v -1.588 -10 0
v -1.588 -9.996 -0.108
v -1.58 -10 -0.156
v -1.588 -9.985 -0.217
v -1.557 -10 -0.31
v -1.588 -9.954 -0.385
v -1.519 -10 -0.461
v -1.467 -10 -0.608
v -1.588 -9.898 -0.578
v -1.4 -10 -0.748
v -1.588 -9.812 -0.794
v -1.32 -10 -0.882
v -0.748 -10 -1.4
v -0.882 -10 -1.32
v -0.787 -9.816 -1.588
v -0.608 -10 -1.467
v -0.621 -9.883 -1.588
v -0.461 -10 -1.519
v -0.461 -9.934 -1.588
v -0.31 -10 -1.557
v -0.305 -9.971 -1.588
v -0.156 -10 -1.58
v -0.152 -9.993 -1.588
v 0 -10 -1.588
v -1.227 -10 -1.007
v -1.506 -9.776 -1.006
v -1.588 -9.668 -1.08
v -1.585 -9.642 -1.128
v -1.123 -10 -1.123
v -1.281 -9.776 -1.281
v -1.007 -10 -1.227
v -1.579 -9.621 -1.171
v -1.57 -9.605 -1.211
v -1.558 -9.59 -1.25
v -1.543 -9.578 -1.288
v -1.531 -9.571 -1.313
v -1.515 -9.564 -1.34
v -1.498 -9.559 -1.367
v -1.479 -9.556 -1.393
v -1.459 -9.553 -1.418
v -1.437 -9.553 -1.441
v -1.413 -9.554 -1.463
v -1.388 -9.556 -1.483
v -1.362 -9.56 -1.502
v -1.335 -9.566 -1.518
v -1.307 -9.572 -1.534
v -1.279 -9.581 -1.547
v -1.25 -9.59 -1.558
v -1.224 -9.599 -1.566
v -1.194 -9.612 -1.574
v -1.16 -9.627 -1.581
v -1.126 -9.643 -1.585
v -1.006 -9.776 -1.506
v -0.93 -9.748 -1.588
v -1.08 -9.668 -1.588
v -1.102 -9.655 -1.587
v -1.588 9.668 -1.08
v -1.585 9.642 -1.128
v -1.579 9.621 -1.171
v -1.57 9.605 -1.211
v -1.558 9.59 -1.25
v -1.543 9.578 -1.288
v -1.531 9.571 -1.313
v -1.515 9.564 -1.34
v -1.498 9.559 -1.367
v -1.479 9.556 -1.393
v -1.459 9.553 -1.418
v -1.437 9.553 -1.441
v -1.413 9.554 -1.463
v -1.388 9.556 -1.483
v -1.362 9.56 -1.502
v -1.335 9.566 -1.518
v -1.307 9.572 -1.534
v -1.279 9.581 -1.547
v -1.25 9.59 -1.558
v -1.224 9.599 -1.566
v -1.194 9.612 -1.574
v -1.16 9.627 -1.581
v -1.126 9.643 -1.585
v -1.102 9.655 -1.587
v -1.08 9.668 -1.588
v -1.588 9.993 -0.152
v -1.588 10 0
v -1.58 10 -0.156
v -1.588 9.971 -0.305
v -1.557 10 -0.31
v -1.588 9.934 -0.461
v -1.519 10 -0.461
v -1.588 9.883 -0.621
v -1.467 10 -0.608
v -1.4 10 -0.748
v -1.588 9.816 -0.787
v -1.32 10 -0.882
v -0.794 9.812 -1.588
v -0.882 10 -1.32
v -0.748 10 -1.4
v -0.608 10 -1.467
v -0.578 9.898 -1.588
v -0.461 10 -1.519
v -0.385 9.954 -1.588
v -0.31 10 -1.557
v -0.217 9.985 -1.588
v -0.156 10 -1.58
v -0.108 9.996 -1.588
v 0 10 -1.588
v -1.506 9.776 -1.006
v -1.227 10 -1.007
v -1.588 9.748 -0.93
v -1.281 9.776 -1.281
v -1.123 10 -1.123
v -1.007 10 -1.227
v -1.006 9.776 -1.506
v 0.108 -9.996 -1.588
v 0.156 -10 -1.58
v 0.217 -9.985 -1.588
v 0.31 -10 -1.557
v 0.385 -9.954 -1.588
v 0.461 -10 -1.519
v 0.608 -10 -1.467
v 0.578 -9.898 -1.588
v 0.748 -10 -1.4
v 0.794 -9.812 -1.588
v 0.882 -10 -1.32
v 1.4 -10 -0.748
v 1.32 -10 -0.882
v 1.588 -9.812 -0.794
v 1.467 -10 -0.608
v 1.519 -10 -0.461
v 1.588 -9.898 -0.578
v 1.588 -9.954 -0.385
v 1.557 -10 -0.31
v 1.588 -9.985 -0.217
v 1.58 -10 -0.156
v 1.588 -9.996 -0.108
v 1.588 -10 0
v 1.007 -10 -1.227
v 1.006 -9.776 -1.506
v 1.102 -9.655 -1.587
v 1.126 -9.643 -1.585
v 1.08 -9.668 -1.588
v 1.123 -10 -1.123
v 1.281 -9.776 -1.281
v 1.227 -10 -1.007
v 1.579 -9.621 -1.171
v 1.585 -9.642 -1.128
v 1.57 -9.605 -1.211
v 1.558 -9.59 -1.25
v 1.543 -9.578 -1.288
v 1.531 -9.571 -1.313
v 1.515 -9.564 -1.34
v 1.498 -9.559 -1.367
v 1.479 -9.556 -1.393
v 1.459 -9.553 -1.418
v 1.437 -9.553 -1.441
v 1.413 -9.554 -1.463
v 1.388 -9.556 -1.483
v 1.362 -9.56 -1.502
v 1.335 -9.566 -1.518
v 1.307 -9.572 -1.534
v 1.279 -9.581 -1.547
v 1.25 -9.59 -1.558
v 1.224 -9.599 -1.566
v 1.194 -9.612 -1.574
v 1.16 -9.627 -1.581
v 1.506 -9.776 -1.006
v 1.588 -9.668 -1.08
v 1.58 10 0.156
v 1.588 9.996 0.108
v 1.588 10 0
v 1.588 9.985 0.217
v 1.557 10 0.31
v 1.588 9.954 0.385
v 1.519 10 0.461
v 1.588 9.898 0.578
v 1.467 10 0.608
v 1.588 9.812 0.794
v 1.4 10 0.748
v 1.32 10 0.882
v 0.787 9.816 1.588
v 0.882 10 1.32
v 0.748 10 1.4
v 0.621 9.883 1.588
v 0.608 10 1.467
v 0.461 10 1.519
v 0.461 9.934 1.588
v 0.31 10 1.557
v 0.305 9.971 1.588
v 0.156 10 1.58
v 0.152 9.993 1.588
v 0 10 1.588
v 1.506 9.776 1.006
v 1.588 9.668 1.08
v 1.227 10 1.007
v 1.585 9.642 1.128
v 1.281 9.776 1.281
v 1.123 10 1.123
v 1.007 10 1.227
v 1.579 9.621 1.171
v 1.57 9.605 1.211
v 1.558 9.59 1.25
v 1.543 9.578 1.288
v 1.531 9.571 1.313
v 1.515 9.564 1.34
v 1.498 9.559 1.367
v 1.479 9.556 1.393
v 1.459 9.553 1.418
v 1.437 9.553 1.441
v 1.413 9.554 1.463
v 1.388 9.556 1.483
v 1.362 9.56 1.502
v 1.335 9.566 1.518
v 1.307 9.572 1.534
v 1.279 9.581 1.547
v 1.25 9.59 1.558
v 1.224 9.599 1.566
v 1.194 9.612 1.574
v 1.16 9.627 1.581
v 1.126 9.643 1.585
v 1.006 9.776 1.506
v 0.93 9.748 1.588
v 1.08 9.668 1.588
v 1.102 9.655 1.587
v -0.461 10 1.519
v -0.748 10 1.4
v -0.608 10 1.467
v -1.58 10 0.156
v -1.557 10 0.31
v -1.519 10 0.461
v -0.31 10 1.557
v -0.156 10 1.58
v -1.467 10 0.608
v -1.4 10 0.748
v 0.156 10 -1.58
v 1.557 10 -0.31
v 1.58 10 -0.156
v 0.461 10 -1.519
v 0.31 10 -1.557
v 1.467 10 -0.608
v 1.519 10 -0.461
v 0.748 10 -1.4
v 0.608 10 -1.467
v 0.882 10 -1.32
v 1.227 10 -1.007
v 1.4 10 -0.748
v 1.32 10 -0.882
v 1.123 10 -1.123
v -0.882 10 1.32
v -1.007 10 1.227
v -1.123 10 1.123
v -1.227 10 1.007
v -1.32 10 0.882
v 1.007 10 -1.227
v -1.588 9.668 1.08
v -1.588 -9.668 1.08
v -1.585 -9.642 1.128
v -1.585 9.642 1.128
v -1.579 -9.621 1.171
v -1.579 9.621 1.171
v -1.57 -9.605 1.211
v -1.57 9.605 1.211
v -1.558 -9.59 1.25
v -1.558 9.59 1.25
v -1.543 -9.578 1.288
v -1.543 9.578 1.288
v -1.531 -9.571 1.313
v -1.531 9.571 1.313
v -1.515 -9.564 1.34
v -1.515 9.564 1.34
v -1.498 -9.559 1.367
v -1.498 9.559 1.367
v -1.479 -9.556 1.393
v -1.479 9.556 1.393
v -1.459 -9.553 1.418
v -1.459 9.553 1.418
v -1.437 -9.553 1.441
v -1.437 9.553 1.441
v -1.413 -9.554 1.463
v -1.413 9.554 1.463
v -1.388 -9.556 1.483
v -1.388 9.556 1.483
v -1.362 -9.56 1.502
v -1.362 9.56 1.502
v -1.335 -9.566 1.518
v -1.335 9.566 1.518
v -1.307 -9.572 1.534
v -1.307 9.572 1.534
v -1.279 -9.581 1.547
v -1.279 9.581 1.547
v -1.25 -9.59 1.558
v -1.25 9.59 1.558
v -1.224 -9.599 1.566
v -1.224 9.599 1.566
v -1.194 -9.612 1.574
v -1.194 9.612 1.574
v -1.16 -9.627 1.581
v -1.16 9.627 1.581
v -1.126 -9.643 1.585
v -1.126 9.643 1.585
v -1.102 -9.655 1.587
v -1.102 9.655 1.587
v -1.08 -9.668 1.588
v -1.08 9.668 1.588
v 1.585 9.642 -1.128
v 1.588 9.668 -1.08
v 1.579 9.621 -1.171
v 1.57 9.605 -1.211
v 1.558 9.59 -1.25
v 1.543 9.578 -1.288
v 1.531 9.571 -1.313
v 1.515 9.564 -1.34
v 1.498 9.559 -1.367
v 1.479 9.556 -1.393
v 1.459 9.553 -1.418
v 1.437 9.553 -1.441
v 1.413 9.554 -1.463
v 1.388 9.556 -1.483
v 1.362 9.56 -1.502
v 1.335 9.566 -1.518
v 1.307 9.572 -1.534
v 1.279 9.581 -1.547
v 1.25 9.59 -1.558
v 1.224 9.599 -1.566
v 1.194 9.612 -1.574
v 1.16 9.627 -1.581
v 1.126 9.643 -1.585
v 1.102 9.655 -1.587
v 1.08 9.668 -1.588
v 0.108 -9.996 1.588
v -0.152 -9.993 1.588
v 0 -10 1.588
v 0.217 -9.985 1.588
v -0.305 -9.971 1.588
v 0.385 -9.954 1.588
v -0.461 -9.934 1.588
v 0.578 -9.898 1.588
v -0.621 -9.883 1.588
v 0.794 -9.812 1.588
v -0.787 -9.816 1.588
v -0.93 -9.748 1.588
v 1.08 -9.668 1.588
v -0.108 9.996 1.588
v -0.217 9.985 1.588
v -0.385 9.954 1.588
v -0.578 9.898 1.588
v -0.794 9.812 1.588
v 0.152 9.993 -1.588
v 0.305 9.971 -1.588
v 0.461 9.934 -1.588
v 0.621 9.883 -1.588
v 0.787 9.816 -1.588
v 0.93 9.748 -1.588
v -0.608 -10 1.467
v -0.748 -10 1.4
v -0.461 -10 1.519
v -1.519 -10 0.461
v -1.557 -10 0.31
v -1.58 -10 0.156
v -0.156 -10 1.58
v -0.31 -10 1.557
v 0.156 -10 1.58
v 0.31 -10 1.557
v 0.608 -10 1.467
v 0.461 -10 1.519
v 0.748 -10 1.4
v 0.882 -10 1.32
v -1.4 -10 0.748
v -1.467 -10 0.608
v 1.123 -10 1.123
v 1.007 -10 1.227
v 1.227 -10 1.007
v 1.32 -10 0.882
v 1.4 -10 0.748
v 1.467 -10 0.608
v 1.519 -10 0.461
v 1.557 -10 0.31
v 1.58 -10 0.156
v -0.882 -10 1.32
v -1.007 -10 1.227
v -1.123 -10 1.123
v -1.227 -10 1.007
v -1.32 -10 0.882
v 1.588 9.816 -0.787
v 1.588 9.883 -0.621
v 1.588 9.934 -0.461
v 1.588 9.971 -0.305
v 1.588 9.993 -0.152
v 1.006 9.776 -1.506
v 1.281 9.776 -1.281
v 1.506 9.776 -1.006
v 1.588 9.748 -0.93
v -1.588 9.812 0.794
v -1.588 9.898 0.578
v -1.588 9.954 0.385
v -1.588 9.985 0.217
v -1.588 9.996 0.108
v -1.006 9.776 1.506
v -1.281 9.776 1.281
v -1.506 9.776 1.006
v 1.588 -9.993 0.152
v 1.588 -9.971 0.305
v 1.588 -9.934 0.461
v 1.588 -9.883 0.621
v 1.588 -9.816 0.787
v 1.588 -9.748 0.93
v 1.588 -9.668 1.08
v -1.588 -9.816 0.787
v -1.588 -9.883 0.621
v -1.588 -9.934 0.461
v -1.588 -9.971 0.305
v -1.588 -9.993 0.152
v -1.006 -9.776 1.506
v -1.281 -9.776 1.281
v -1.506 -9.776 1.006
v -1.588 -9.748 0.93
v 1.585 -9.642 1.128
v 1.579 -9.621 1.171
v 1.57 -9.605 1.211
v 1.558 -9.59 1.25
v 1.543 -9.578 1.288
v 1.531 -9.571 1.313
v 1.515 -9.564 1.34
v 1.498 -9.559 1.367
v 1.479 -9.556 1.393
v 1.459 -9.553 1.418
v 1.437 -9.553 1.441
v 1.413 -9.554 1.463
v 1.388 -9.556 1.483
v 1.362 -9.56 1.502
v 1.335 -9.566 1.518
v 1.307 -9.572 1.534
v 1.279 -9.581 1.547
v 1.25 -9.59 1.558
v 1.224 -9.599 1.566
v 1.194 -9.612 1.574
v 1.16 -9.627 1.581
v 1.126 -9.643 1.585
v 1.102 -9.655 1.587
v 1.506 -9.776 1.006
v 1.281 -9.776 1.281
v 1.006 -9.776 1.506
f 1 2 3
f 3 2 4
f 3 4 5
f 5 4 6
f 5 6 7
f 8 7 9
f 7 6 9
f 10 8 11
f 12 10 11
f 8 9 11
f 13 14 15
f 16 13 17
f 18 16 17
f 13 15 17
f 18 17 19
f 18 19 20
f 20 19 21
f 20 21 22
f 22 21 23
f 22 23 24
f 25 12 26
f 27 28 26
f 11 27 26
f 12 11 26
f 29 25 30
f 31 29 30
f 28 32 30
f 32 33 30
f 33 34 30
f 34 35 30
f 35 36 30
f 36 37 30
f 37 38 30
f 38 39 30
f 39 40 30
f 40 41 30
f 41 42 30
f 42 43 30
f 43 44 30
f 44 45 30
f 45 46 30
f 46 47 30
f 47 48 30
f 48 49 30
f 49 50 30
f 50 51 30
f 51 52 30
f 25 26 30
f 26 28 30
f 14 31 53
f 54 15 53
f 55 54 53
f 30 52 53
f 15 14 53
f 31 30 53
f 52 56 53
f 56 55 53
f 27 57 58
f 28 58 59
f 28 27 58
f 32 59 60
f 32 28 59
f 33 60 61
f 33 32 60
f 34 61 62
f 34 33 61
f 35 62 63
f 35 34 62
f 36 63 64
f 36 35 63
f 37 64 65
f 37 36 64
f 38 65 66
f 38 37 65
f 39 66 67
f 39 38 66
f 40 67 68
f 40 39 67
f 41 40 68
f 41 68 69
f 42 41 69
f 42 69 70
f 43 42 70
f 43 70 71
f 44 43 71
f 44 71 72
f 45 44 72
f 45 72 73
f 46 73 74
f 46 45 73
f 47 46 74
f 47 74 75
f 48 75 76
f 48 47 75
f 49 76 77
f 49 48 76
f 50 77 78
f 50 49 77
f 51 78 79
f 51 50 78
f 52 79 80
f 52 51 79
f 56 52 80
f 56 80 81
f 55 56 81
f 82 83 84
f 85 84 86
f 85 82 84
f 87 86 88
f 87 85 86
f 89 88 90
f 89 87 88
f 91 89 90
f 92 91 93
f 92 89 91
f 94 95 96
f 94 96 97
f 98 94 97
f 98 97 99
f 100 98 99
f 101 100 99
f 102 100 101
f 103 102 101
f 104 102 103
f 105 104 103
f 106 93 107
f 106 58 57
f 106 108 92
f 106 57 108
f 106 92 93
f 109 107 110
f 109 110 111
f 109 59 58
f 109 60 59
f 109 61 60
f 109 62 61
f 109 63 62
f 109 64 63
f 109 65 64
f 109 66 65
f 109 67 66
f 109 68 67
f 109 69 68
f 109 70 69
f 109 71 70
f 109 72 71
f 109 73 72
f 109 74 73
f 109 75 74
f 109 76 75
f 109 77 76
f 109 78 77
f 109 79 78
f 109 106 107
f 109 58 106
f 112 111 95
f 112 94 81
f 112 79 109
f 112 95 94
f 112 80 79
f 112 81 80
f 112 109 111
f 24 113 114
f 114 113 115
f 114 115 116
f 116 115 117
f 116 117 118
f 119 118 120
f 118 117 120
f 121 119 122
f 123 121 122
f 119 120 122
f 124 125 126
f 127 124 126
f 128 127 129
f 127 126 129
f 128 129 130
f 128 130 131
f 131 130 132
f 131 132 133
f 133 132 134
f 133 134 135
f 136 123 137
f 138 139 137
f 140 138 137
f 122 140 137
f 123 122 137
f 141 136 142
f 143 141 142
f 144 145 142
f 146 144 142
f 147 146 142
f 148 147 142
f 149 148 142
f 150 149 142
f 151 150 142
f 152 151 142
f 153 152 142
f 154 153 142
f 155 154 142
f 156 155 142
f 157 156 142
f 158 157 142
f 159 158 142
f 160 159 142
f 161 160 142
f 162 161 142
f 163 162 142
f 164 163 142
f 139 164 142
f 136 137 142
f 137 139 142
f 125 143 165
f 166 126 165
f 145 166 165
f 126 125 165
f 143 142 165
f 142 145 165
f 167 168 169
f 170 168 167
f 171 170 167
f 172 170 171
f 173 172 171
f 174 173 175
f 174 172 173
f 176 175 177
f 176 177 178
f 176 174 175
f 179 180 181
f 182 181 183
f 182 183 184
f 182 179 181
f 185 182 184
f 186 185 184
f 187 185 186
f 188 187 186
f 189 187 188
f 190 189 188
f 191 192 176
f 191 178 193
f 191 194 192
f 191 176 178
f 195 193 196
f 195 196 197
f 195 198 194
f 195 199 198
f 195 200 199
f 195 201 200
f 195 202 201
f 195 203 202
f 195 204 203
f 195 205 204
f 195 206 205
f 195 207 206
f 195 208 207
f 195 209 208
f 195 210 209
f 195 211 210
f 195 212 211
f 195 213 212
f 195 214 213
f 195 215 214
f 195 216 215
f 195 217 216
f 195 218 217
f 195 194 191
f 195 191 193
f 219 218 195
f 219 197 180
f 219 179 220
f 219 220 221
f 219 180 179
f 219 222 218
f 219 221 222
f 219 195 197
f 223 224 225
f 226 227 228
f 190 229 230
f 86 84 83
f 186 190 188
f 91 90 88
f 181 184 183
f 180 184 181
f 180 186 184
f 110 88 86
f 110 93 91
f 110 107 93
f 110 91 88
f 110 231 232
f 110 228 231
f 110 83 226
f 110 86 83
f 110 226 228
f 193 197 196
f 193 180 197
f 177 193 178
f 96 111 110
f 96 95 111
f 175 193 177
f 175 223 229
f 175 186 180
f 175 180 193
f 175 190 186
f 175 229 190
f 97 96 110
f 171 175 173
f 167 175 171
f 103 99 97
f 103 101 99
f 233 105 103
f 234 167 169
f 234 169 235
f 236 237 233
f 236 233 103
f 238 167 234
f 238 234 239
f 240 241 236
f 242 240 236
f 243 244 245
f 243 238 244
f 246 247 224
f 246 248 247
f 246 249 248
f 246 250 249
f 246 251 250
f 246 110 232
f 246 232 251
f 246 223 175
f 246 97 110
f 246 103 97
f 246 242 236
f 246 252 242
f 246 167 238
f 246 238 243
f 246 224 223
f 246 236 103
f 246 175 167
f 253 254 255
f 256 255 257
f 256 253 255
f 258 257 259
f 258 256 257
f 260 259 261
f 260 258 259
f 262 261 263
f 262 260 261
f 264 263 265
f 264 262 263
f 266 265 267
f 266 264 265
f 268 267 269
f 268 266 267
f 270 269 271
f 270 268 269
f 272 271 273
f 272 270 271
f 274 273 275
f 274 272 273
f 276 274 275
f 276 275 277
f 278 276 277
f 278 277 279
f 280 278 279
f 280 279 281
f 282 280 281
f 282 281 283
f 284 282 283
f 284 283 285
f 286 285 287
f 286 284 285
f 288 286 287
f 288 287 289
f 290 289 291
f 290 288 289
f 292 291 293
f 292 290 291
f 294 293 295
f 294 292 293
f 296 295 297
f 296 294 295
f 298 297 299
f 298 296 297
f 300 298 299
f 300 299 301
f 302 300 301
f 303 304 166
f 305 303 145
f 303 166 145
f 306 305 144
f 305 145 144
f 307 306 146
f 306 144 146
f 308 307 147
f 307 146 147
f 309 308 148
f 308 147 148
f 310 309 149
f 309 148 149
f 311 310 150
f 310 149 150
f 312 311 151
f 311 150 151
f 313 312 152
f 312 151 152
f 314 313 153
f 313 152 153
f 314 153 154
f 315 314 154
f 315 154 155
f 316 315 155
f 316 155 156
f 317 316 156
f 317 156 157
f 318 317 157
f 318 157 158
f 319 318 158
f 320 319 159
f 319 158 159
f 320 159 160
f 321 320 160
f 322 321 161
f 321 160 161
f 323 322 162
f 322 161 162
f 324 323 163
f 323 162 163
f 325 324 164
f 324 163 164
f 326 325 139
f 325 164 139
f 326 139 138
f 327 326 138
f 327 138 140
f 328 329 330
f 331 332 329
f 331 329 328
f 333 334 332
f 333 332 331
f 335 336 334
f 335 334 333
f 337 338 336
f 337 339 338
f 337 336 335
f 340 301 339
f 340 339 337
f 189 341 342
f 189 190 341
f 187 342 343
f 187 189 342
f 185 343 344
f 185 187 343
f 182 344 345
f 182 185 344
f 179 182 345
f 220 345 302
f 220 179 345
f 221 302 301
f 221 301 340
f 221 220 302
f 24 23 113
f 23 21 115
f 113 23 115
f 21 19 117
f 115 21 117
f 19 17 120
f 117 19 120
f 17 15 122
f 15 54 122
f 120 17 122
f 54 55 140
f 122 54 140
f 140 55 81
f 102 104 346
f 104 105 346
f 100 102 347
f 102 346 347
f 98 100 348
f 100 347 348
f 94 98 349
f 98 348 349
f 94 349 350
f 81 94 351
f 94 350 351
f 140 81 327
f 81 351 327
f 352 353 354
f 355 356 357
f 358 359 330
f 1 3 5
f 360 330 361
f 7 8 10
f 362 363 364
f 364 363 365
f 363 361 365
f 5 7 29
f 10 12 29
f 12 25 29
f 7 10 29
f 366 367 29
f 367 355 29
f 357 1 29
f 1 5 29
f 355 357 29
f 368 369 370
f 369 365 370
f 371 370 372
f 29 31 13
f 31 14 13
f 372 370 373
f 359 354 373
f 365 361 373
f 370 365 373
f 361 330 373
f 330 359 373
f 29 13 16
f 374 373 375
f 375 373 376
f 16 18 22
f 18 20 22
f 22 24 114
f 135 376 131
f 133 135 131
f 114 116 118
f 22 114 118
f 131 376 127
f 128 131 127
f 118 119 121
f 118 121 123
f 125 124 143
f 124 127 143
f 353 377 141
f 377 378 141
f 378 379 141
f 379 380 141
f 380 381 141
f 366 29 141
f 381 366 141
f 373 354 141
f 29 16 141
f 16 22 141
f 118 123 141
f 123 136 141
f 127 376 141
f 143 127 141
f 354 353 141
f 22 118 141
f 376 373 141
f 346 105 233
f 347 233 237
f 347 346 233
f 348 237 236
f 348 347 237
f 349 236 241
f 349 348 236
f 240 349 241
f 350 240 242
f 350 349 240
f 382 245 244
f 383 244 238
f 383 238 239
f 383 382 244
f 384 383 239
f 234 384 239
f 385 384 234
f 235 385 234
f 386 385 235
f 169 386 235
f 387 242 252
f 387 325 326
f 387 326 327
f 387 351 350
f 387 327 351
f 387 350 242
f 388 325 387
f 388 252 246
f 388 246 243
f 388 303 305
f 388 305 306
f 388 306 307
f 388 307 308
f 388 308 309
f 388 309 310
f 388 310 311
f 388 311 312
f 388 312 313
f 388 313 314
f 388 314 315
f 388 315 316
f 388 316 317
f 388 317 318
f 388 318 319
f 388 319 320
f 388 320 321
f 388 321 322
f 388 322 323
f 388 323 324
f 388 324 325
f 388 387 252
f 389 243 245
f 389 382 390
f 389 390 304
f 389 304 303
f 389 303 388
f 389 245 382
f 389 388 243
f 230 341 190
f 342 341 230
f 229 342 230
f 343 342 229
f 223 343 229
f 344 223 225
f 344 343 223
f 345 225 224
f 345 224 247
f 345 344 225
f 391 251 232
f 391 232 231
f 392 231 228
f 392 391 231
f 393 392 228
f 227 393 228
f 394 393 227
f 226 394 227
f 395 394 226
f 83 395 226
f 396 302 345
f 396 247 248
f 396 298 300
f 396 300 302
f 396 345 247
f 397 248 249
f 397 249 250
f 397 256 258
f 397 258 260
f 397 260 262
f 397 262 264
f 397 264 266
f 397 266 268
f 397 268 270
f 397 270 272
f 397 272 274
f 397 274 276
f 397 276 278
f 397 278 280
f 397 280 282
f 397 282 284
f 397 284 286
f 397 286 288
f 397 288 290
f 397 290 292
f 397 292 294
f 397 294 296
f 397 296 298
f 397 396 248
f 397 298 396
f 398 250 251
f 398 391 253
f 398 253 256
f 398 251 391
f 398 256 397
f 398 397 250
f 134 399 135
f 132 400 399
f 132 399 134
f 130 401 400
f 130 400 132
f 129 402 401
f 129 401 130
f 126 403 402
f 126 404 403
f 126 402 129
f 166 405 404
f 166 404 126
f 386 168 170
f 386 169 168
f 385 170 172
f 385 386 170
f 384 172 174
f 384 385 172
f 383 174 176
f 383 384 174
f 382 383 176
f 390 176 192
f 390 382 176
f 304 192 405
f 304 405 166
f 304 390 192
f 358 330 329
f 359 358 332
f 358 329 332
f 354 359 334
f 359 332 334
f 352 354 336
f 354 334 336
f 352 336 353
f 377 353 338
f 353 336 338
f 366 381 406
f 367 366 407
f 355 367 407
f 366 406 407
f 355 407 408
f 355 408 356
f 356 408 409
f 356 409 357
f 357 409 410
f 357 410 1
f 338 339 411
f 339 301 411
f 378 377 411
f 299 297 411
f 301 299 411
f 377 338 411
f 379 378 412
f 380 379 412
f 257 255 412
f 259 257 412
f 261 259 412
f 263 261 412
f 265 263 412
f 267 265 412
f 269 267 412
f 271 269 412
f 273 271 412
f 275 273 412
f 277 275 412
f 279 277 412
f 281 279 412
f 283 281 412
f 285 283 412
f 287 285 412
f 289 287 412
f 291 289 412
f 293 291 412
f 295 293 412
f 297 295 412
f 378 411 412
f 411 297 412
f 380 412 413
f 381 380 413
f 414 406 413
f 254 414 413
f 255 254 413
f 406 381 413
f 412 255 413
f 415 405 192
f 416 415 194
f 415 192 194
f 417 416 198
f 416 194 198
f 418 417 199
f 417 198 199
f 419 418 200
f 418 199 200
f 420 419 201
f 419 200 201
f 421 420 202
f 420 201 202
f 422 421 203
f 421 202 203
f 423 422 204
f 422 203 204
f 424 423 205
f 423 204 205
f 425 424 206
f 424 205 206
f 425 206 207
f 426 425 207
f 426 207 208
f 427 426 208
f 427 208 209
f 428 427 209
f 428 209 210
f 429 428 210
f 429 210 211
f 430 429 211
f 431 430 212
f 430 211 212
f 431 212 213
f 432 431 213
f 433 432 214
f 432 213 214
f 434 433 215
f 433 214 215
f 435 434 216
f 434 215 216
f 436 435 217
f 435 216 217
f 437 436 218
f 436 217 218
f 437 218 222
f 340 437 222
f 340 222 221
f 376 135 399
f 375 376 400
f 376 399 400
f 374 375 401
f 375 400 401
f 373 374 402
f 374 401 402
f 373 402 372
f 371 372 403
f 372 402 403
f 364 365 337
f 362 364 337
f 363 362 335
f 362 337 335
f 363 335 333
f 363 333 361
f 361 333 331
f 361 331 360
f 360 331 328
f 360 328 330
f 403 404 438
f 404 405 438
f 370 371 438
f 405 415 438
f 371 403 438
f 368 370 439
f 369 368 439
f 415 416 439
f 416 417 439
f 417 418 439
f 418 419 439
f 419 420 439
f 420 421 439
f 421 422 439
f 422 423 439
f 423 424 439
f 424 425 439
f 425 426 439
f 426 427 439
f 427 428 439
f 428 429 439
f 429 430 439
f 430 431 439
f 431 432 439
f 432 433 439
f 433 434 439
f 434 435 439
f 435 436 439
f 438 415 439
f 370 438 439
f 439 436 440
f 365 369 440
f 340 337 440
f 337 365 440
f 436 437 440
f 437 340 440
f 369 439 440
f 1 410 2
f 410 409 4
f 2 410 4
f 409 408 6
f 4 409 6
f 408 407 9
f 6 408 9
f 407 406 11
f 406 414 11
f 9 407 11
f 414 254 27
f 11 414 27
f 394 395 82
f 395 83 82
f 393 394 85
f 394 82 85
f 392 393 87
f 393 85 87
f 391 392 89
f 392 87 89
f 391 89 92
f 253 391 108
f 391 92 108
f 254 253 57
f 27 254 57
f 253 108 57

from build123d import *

# Parameters (mm, degrees)
SKETCH1_W           = 3.175
SKETCH1_H           = 3.175
BOSS_EXTRUDE1_DEPTH = 10
FILLET1_R           = 0.508


with BuildPart() as part:
    # Sketch1 → Boss-Extrude1 (new, symmetric)
    with BuildSketch(Plane(origin=(0, 0, 0), x_dir=(1, 0, 0), z_dir=(0, 1, 0))):
        Rectangle(SKETCH1_W, SKETCH1_H)
    extrude(amount=BOSS_EXTRUDE1_DEPTH, both=True)

    # Fillet1
    fillet1_edges = [part.edges().sort_by_distance(p)[0] for p in [
        (1.5875, 0, 1.5875),
        (-1.5875, 0, 1.5875),
        (-1.5875, 0, -1.5875),
        (1.5875, 0, -1.5875),
    ]]
    fillet(fillet1_edges, radius=FILLET1_R)

    # Sketch3 → Cut-Revolve3 (revolve, cut)
    with BuildSketch(Plane.XY):
        Polygon((1.5875, -10), (2.294606781, -9.292893219), (2.294606781, -11), (1.5875, -11), align=None)
    cut_revolve3 = revolve(axis=Axis((0, 0, 0), (0, -1, 0)), mode=Mode.SUBTRACT)

    # Mirror1: Cut-Revolve3 across plane
    add(cut_revolve3.mirror(Plane.ZX), mode=Mode.SUBTRACT)


solid = part.part
